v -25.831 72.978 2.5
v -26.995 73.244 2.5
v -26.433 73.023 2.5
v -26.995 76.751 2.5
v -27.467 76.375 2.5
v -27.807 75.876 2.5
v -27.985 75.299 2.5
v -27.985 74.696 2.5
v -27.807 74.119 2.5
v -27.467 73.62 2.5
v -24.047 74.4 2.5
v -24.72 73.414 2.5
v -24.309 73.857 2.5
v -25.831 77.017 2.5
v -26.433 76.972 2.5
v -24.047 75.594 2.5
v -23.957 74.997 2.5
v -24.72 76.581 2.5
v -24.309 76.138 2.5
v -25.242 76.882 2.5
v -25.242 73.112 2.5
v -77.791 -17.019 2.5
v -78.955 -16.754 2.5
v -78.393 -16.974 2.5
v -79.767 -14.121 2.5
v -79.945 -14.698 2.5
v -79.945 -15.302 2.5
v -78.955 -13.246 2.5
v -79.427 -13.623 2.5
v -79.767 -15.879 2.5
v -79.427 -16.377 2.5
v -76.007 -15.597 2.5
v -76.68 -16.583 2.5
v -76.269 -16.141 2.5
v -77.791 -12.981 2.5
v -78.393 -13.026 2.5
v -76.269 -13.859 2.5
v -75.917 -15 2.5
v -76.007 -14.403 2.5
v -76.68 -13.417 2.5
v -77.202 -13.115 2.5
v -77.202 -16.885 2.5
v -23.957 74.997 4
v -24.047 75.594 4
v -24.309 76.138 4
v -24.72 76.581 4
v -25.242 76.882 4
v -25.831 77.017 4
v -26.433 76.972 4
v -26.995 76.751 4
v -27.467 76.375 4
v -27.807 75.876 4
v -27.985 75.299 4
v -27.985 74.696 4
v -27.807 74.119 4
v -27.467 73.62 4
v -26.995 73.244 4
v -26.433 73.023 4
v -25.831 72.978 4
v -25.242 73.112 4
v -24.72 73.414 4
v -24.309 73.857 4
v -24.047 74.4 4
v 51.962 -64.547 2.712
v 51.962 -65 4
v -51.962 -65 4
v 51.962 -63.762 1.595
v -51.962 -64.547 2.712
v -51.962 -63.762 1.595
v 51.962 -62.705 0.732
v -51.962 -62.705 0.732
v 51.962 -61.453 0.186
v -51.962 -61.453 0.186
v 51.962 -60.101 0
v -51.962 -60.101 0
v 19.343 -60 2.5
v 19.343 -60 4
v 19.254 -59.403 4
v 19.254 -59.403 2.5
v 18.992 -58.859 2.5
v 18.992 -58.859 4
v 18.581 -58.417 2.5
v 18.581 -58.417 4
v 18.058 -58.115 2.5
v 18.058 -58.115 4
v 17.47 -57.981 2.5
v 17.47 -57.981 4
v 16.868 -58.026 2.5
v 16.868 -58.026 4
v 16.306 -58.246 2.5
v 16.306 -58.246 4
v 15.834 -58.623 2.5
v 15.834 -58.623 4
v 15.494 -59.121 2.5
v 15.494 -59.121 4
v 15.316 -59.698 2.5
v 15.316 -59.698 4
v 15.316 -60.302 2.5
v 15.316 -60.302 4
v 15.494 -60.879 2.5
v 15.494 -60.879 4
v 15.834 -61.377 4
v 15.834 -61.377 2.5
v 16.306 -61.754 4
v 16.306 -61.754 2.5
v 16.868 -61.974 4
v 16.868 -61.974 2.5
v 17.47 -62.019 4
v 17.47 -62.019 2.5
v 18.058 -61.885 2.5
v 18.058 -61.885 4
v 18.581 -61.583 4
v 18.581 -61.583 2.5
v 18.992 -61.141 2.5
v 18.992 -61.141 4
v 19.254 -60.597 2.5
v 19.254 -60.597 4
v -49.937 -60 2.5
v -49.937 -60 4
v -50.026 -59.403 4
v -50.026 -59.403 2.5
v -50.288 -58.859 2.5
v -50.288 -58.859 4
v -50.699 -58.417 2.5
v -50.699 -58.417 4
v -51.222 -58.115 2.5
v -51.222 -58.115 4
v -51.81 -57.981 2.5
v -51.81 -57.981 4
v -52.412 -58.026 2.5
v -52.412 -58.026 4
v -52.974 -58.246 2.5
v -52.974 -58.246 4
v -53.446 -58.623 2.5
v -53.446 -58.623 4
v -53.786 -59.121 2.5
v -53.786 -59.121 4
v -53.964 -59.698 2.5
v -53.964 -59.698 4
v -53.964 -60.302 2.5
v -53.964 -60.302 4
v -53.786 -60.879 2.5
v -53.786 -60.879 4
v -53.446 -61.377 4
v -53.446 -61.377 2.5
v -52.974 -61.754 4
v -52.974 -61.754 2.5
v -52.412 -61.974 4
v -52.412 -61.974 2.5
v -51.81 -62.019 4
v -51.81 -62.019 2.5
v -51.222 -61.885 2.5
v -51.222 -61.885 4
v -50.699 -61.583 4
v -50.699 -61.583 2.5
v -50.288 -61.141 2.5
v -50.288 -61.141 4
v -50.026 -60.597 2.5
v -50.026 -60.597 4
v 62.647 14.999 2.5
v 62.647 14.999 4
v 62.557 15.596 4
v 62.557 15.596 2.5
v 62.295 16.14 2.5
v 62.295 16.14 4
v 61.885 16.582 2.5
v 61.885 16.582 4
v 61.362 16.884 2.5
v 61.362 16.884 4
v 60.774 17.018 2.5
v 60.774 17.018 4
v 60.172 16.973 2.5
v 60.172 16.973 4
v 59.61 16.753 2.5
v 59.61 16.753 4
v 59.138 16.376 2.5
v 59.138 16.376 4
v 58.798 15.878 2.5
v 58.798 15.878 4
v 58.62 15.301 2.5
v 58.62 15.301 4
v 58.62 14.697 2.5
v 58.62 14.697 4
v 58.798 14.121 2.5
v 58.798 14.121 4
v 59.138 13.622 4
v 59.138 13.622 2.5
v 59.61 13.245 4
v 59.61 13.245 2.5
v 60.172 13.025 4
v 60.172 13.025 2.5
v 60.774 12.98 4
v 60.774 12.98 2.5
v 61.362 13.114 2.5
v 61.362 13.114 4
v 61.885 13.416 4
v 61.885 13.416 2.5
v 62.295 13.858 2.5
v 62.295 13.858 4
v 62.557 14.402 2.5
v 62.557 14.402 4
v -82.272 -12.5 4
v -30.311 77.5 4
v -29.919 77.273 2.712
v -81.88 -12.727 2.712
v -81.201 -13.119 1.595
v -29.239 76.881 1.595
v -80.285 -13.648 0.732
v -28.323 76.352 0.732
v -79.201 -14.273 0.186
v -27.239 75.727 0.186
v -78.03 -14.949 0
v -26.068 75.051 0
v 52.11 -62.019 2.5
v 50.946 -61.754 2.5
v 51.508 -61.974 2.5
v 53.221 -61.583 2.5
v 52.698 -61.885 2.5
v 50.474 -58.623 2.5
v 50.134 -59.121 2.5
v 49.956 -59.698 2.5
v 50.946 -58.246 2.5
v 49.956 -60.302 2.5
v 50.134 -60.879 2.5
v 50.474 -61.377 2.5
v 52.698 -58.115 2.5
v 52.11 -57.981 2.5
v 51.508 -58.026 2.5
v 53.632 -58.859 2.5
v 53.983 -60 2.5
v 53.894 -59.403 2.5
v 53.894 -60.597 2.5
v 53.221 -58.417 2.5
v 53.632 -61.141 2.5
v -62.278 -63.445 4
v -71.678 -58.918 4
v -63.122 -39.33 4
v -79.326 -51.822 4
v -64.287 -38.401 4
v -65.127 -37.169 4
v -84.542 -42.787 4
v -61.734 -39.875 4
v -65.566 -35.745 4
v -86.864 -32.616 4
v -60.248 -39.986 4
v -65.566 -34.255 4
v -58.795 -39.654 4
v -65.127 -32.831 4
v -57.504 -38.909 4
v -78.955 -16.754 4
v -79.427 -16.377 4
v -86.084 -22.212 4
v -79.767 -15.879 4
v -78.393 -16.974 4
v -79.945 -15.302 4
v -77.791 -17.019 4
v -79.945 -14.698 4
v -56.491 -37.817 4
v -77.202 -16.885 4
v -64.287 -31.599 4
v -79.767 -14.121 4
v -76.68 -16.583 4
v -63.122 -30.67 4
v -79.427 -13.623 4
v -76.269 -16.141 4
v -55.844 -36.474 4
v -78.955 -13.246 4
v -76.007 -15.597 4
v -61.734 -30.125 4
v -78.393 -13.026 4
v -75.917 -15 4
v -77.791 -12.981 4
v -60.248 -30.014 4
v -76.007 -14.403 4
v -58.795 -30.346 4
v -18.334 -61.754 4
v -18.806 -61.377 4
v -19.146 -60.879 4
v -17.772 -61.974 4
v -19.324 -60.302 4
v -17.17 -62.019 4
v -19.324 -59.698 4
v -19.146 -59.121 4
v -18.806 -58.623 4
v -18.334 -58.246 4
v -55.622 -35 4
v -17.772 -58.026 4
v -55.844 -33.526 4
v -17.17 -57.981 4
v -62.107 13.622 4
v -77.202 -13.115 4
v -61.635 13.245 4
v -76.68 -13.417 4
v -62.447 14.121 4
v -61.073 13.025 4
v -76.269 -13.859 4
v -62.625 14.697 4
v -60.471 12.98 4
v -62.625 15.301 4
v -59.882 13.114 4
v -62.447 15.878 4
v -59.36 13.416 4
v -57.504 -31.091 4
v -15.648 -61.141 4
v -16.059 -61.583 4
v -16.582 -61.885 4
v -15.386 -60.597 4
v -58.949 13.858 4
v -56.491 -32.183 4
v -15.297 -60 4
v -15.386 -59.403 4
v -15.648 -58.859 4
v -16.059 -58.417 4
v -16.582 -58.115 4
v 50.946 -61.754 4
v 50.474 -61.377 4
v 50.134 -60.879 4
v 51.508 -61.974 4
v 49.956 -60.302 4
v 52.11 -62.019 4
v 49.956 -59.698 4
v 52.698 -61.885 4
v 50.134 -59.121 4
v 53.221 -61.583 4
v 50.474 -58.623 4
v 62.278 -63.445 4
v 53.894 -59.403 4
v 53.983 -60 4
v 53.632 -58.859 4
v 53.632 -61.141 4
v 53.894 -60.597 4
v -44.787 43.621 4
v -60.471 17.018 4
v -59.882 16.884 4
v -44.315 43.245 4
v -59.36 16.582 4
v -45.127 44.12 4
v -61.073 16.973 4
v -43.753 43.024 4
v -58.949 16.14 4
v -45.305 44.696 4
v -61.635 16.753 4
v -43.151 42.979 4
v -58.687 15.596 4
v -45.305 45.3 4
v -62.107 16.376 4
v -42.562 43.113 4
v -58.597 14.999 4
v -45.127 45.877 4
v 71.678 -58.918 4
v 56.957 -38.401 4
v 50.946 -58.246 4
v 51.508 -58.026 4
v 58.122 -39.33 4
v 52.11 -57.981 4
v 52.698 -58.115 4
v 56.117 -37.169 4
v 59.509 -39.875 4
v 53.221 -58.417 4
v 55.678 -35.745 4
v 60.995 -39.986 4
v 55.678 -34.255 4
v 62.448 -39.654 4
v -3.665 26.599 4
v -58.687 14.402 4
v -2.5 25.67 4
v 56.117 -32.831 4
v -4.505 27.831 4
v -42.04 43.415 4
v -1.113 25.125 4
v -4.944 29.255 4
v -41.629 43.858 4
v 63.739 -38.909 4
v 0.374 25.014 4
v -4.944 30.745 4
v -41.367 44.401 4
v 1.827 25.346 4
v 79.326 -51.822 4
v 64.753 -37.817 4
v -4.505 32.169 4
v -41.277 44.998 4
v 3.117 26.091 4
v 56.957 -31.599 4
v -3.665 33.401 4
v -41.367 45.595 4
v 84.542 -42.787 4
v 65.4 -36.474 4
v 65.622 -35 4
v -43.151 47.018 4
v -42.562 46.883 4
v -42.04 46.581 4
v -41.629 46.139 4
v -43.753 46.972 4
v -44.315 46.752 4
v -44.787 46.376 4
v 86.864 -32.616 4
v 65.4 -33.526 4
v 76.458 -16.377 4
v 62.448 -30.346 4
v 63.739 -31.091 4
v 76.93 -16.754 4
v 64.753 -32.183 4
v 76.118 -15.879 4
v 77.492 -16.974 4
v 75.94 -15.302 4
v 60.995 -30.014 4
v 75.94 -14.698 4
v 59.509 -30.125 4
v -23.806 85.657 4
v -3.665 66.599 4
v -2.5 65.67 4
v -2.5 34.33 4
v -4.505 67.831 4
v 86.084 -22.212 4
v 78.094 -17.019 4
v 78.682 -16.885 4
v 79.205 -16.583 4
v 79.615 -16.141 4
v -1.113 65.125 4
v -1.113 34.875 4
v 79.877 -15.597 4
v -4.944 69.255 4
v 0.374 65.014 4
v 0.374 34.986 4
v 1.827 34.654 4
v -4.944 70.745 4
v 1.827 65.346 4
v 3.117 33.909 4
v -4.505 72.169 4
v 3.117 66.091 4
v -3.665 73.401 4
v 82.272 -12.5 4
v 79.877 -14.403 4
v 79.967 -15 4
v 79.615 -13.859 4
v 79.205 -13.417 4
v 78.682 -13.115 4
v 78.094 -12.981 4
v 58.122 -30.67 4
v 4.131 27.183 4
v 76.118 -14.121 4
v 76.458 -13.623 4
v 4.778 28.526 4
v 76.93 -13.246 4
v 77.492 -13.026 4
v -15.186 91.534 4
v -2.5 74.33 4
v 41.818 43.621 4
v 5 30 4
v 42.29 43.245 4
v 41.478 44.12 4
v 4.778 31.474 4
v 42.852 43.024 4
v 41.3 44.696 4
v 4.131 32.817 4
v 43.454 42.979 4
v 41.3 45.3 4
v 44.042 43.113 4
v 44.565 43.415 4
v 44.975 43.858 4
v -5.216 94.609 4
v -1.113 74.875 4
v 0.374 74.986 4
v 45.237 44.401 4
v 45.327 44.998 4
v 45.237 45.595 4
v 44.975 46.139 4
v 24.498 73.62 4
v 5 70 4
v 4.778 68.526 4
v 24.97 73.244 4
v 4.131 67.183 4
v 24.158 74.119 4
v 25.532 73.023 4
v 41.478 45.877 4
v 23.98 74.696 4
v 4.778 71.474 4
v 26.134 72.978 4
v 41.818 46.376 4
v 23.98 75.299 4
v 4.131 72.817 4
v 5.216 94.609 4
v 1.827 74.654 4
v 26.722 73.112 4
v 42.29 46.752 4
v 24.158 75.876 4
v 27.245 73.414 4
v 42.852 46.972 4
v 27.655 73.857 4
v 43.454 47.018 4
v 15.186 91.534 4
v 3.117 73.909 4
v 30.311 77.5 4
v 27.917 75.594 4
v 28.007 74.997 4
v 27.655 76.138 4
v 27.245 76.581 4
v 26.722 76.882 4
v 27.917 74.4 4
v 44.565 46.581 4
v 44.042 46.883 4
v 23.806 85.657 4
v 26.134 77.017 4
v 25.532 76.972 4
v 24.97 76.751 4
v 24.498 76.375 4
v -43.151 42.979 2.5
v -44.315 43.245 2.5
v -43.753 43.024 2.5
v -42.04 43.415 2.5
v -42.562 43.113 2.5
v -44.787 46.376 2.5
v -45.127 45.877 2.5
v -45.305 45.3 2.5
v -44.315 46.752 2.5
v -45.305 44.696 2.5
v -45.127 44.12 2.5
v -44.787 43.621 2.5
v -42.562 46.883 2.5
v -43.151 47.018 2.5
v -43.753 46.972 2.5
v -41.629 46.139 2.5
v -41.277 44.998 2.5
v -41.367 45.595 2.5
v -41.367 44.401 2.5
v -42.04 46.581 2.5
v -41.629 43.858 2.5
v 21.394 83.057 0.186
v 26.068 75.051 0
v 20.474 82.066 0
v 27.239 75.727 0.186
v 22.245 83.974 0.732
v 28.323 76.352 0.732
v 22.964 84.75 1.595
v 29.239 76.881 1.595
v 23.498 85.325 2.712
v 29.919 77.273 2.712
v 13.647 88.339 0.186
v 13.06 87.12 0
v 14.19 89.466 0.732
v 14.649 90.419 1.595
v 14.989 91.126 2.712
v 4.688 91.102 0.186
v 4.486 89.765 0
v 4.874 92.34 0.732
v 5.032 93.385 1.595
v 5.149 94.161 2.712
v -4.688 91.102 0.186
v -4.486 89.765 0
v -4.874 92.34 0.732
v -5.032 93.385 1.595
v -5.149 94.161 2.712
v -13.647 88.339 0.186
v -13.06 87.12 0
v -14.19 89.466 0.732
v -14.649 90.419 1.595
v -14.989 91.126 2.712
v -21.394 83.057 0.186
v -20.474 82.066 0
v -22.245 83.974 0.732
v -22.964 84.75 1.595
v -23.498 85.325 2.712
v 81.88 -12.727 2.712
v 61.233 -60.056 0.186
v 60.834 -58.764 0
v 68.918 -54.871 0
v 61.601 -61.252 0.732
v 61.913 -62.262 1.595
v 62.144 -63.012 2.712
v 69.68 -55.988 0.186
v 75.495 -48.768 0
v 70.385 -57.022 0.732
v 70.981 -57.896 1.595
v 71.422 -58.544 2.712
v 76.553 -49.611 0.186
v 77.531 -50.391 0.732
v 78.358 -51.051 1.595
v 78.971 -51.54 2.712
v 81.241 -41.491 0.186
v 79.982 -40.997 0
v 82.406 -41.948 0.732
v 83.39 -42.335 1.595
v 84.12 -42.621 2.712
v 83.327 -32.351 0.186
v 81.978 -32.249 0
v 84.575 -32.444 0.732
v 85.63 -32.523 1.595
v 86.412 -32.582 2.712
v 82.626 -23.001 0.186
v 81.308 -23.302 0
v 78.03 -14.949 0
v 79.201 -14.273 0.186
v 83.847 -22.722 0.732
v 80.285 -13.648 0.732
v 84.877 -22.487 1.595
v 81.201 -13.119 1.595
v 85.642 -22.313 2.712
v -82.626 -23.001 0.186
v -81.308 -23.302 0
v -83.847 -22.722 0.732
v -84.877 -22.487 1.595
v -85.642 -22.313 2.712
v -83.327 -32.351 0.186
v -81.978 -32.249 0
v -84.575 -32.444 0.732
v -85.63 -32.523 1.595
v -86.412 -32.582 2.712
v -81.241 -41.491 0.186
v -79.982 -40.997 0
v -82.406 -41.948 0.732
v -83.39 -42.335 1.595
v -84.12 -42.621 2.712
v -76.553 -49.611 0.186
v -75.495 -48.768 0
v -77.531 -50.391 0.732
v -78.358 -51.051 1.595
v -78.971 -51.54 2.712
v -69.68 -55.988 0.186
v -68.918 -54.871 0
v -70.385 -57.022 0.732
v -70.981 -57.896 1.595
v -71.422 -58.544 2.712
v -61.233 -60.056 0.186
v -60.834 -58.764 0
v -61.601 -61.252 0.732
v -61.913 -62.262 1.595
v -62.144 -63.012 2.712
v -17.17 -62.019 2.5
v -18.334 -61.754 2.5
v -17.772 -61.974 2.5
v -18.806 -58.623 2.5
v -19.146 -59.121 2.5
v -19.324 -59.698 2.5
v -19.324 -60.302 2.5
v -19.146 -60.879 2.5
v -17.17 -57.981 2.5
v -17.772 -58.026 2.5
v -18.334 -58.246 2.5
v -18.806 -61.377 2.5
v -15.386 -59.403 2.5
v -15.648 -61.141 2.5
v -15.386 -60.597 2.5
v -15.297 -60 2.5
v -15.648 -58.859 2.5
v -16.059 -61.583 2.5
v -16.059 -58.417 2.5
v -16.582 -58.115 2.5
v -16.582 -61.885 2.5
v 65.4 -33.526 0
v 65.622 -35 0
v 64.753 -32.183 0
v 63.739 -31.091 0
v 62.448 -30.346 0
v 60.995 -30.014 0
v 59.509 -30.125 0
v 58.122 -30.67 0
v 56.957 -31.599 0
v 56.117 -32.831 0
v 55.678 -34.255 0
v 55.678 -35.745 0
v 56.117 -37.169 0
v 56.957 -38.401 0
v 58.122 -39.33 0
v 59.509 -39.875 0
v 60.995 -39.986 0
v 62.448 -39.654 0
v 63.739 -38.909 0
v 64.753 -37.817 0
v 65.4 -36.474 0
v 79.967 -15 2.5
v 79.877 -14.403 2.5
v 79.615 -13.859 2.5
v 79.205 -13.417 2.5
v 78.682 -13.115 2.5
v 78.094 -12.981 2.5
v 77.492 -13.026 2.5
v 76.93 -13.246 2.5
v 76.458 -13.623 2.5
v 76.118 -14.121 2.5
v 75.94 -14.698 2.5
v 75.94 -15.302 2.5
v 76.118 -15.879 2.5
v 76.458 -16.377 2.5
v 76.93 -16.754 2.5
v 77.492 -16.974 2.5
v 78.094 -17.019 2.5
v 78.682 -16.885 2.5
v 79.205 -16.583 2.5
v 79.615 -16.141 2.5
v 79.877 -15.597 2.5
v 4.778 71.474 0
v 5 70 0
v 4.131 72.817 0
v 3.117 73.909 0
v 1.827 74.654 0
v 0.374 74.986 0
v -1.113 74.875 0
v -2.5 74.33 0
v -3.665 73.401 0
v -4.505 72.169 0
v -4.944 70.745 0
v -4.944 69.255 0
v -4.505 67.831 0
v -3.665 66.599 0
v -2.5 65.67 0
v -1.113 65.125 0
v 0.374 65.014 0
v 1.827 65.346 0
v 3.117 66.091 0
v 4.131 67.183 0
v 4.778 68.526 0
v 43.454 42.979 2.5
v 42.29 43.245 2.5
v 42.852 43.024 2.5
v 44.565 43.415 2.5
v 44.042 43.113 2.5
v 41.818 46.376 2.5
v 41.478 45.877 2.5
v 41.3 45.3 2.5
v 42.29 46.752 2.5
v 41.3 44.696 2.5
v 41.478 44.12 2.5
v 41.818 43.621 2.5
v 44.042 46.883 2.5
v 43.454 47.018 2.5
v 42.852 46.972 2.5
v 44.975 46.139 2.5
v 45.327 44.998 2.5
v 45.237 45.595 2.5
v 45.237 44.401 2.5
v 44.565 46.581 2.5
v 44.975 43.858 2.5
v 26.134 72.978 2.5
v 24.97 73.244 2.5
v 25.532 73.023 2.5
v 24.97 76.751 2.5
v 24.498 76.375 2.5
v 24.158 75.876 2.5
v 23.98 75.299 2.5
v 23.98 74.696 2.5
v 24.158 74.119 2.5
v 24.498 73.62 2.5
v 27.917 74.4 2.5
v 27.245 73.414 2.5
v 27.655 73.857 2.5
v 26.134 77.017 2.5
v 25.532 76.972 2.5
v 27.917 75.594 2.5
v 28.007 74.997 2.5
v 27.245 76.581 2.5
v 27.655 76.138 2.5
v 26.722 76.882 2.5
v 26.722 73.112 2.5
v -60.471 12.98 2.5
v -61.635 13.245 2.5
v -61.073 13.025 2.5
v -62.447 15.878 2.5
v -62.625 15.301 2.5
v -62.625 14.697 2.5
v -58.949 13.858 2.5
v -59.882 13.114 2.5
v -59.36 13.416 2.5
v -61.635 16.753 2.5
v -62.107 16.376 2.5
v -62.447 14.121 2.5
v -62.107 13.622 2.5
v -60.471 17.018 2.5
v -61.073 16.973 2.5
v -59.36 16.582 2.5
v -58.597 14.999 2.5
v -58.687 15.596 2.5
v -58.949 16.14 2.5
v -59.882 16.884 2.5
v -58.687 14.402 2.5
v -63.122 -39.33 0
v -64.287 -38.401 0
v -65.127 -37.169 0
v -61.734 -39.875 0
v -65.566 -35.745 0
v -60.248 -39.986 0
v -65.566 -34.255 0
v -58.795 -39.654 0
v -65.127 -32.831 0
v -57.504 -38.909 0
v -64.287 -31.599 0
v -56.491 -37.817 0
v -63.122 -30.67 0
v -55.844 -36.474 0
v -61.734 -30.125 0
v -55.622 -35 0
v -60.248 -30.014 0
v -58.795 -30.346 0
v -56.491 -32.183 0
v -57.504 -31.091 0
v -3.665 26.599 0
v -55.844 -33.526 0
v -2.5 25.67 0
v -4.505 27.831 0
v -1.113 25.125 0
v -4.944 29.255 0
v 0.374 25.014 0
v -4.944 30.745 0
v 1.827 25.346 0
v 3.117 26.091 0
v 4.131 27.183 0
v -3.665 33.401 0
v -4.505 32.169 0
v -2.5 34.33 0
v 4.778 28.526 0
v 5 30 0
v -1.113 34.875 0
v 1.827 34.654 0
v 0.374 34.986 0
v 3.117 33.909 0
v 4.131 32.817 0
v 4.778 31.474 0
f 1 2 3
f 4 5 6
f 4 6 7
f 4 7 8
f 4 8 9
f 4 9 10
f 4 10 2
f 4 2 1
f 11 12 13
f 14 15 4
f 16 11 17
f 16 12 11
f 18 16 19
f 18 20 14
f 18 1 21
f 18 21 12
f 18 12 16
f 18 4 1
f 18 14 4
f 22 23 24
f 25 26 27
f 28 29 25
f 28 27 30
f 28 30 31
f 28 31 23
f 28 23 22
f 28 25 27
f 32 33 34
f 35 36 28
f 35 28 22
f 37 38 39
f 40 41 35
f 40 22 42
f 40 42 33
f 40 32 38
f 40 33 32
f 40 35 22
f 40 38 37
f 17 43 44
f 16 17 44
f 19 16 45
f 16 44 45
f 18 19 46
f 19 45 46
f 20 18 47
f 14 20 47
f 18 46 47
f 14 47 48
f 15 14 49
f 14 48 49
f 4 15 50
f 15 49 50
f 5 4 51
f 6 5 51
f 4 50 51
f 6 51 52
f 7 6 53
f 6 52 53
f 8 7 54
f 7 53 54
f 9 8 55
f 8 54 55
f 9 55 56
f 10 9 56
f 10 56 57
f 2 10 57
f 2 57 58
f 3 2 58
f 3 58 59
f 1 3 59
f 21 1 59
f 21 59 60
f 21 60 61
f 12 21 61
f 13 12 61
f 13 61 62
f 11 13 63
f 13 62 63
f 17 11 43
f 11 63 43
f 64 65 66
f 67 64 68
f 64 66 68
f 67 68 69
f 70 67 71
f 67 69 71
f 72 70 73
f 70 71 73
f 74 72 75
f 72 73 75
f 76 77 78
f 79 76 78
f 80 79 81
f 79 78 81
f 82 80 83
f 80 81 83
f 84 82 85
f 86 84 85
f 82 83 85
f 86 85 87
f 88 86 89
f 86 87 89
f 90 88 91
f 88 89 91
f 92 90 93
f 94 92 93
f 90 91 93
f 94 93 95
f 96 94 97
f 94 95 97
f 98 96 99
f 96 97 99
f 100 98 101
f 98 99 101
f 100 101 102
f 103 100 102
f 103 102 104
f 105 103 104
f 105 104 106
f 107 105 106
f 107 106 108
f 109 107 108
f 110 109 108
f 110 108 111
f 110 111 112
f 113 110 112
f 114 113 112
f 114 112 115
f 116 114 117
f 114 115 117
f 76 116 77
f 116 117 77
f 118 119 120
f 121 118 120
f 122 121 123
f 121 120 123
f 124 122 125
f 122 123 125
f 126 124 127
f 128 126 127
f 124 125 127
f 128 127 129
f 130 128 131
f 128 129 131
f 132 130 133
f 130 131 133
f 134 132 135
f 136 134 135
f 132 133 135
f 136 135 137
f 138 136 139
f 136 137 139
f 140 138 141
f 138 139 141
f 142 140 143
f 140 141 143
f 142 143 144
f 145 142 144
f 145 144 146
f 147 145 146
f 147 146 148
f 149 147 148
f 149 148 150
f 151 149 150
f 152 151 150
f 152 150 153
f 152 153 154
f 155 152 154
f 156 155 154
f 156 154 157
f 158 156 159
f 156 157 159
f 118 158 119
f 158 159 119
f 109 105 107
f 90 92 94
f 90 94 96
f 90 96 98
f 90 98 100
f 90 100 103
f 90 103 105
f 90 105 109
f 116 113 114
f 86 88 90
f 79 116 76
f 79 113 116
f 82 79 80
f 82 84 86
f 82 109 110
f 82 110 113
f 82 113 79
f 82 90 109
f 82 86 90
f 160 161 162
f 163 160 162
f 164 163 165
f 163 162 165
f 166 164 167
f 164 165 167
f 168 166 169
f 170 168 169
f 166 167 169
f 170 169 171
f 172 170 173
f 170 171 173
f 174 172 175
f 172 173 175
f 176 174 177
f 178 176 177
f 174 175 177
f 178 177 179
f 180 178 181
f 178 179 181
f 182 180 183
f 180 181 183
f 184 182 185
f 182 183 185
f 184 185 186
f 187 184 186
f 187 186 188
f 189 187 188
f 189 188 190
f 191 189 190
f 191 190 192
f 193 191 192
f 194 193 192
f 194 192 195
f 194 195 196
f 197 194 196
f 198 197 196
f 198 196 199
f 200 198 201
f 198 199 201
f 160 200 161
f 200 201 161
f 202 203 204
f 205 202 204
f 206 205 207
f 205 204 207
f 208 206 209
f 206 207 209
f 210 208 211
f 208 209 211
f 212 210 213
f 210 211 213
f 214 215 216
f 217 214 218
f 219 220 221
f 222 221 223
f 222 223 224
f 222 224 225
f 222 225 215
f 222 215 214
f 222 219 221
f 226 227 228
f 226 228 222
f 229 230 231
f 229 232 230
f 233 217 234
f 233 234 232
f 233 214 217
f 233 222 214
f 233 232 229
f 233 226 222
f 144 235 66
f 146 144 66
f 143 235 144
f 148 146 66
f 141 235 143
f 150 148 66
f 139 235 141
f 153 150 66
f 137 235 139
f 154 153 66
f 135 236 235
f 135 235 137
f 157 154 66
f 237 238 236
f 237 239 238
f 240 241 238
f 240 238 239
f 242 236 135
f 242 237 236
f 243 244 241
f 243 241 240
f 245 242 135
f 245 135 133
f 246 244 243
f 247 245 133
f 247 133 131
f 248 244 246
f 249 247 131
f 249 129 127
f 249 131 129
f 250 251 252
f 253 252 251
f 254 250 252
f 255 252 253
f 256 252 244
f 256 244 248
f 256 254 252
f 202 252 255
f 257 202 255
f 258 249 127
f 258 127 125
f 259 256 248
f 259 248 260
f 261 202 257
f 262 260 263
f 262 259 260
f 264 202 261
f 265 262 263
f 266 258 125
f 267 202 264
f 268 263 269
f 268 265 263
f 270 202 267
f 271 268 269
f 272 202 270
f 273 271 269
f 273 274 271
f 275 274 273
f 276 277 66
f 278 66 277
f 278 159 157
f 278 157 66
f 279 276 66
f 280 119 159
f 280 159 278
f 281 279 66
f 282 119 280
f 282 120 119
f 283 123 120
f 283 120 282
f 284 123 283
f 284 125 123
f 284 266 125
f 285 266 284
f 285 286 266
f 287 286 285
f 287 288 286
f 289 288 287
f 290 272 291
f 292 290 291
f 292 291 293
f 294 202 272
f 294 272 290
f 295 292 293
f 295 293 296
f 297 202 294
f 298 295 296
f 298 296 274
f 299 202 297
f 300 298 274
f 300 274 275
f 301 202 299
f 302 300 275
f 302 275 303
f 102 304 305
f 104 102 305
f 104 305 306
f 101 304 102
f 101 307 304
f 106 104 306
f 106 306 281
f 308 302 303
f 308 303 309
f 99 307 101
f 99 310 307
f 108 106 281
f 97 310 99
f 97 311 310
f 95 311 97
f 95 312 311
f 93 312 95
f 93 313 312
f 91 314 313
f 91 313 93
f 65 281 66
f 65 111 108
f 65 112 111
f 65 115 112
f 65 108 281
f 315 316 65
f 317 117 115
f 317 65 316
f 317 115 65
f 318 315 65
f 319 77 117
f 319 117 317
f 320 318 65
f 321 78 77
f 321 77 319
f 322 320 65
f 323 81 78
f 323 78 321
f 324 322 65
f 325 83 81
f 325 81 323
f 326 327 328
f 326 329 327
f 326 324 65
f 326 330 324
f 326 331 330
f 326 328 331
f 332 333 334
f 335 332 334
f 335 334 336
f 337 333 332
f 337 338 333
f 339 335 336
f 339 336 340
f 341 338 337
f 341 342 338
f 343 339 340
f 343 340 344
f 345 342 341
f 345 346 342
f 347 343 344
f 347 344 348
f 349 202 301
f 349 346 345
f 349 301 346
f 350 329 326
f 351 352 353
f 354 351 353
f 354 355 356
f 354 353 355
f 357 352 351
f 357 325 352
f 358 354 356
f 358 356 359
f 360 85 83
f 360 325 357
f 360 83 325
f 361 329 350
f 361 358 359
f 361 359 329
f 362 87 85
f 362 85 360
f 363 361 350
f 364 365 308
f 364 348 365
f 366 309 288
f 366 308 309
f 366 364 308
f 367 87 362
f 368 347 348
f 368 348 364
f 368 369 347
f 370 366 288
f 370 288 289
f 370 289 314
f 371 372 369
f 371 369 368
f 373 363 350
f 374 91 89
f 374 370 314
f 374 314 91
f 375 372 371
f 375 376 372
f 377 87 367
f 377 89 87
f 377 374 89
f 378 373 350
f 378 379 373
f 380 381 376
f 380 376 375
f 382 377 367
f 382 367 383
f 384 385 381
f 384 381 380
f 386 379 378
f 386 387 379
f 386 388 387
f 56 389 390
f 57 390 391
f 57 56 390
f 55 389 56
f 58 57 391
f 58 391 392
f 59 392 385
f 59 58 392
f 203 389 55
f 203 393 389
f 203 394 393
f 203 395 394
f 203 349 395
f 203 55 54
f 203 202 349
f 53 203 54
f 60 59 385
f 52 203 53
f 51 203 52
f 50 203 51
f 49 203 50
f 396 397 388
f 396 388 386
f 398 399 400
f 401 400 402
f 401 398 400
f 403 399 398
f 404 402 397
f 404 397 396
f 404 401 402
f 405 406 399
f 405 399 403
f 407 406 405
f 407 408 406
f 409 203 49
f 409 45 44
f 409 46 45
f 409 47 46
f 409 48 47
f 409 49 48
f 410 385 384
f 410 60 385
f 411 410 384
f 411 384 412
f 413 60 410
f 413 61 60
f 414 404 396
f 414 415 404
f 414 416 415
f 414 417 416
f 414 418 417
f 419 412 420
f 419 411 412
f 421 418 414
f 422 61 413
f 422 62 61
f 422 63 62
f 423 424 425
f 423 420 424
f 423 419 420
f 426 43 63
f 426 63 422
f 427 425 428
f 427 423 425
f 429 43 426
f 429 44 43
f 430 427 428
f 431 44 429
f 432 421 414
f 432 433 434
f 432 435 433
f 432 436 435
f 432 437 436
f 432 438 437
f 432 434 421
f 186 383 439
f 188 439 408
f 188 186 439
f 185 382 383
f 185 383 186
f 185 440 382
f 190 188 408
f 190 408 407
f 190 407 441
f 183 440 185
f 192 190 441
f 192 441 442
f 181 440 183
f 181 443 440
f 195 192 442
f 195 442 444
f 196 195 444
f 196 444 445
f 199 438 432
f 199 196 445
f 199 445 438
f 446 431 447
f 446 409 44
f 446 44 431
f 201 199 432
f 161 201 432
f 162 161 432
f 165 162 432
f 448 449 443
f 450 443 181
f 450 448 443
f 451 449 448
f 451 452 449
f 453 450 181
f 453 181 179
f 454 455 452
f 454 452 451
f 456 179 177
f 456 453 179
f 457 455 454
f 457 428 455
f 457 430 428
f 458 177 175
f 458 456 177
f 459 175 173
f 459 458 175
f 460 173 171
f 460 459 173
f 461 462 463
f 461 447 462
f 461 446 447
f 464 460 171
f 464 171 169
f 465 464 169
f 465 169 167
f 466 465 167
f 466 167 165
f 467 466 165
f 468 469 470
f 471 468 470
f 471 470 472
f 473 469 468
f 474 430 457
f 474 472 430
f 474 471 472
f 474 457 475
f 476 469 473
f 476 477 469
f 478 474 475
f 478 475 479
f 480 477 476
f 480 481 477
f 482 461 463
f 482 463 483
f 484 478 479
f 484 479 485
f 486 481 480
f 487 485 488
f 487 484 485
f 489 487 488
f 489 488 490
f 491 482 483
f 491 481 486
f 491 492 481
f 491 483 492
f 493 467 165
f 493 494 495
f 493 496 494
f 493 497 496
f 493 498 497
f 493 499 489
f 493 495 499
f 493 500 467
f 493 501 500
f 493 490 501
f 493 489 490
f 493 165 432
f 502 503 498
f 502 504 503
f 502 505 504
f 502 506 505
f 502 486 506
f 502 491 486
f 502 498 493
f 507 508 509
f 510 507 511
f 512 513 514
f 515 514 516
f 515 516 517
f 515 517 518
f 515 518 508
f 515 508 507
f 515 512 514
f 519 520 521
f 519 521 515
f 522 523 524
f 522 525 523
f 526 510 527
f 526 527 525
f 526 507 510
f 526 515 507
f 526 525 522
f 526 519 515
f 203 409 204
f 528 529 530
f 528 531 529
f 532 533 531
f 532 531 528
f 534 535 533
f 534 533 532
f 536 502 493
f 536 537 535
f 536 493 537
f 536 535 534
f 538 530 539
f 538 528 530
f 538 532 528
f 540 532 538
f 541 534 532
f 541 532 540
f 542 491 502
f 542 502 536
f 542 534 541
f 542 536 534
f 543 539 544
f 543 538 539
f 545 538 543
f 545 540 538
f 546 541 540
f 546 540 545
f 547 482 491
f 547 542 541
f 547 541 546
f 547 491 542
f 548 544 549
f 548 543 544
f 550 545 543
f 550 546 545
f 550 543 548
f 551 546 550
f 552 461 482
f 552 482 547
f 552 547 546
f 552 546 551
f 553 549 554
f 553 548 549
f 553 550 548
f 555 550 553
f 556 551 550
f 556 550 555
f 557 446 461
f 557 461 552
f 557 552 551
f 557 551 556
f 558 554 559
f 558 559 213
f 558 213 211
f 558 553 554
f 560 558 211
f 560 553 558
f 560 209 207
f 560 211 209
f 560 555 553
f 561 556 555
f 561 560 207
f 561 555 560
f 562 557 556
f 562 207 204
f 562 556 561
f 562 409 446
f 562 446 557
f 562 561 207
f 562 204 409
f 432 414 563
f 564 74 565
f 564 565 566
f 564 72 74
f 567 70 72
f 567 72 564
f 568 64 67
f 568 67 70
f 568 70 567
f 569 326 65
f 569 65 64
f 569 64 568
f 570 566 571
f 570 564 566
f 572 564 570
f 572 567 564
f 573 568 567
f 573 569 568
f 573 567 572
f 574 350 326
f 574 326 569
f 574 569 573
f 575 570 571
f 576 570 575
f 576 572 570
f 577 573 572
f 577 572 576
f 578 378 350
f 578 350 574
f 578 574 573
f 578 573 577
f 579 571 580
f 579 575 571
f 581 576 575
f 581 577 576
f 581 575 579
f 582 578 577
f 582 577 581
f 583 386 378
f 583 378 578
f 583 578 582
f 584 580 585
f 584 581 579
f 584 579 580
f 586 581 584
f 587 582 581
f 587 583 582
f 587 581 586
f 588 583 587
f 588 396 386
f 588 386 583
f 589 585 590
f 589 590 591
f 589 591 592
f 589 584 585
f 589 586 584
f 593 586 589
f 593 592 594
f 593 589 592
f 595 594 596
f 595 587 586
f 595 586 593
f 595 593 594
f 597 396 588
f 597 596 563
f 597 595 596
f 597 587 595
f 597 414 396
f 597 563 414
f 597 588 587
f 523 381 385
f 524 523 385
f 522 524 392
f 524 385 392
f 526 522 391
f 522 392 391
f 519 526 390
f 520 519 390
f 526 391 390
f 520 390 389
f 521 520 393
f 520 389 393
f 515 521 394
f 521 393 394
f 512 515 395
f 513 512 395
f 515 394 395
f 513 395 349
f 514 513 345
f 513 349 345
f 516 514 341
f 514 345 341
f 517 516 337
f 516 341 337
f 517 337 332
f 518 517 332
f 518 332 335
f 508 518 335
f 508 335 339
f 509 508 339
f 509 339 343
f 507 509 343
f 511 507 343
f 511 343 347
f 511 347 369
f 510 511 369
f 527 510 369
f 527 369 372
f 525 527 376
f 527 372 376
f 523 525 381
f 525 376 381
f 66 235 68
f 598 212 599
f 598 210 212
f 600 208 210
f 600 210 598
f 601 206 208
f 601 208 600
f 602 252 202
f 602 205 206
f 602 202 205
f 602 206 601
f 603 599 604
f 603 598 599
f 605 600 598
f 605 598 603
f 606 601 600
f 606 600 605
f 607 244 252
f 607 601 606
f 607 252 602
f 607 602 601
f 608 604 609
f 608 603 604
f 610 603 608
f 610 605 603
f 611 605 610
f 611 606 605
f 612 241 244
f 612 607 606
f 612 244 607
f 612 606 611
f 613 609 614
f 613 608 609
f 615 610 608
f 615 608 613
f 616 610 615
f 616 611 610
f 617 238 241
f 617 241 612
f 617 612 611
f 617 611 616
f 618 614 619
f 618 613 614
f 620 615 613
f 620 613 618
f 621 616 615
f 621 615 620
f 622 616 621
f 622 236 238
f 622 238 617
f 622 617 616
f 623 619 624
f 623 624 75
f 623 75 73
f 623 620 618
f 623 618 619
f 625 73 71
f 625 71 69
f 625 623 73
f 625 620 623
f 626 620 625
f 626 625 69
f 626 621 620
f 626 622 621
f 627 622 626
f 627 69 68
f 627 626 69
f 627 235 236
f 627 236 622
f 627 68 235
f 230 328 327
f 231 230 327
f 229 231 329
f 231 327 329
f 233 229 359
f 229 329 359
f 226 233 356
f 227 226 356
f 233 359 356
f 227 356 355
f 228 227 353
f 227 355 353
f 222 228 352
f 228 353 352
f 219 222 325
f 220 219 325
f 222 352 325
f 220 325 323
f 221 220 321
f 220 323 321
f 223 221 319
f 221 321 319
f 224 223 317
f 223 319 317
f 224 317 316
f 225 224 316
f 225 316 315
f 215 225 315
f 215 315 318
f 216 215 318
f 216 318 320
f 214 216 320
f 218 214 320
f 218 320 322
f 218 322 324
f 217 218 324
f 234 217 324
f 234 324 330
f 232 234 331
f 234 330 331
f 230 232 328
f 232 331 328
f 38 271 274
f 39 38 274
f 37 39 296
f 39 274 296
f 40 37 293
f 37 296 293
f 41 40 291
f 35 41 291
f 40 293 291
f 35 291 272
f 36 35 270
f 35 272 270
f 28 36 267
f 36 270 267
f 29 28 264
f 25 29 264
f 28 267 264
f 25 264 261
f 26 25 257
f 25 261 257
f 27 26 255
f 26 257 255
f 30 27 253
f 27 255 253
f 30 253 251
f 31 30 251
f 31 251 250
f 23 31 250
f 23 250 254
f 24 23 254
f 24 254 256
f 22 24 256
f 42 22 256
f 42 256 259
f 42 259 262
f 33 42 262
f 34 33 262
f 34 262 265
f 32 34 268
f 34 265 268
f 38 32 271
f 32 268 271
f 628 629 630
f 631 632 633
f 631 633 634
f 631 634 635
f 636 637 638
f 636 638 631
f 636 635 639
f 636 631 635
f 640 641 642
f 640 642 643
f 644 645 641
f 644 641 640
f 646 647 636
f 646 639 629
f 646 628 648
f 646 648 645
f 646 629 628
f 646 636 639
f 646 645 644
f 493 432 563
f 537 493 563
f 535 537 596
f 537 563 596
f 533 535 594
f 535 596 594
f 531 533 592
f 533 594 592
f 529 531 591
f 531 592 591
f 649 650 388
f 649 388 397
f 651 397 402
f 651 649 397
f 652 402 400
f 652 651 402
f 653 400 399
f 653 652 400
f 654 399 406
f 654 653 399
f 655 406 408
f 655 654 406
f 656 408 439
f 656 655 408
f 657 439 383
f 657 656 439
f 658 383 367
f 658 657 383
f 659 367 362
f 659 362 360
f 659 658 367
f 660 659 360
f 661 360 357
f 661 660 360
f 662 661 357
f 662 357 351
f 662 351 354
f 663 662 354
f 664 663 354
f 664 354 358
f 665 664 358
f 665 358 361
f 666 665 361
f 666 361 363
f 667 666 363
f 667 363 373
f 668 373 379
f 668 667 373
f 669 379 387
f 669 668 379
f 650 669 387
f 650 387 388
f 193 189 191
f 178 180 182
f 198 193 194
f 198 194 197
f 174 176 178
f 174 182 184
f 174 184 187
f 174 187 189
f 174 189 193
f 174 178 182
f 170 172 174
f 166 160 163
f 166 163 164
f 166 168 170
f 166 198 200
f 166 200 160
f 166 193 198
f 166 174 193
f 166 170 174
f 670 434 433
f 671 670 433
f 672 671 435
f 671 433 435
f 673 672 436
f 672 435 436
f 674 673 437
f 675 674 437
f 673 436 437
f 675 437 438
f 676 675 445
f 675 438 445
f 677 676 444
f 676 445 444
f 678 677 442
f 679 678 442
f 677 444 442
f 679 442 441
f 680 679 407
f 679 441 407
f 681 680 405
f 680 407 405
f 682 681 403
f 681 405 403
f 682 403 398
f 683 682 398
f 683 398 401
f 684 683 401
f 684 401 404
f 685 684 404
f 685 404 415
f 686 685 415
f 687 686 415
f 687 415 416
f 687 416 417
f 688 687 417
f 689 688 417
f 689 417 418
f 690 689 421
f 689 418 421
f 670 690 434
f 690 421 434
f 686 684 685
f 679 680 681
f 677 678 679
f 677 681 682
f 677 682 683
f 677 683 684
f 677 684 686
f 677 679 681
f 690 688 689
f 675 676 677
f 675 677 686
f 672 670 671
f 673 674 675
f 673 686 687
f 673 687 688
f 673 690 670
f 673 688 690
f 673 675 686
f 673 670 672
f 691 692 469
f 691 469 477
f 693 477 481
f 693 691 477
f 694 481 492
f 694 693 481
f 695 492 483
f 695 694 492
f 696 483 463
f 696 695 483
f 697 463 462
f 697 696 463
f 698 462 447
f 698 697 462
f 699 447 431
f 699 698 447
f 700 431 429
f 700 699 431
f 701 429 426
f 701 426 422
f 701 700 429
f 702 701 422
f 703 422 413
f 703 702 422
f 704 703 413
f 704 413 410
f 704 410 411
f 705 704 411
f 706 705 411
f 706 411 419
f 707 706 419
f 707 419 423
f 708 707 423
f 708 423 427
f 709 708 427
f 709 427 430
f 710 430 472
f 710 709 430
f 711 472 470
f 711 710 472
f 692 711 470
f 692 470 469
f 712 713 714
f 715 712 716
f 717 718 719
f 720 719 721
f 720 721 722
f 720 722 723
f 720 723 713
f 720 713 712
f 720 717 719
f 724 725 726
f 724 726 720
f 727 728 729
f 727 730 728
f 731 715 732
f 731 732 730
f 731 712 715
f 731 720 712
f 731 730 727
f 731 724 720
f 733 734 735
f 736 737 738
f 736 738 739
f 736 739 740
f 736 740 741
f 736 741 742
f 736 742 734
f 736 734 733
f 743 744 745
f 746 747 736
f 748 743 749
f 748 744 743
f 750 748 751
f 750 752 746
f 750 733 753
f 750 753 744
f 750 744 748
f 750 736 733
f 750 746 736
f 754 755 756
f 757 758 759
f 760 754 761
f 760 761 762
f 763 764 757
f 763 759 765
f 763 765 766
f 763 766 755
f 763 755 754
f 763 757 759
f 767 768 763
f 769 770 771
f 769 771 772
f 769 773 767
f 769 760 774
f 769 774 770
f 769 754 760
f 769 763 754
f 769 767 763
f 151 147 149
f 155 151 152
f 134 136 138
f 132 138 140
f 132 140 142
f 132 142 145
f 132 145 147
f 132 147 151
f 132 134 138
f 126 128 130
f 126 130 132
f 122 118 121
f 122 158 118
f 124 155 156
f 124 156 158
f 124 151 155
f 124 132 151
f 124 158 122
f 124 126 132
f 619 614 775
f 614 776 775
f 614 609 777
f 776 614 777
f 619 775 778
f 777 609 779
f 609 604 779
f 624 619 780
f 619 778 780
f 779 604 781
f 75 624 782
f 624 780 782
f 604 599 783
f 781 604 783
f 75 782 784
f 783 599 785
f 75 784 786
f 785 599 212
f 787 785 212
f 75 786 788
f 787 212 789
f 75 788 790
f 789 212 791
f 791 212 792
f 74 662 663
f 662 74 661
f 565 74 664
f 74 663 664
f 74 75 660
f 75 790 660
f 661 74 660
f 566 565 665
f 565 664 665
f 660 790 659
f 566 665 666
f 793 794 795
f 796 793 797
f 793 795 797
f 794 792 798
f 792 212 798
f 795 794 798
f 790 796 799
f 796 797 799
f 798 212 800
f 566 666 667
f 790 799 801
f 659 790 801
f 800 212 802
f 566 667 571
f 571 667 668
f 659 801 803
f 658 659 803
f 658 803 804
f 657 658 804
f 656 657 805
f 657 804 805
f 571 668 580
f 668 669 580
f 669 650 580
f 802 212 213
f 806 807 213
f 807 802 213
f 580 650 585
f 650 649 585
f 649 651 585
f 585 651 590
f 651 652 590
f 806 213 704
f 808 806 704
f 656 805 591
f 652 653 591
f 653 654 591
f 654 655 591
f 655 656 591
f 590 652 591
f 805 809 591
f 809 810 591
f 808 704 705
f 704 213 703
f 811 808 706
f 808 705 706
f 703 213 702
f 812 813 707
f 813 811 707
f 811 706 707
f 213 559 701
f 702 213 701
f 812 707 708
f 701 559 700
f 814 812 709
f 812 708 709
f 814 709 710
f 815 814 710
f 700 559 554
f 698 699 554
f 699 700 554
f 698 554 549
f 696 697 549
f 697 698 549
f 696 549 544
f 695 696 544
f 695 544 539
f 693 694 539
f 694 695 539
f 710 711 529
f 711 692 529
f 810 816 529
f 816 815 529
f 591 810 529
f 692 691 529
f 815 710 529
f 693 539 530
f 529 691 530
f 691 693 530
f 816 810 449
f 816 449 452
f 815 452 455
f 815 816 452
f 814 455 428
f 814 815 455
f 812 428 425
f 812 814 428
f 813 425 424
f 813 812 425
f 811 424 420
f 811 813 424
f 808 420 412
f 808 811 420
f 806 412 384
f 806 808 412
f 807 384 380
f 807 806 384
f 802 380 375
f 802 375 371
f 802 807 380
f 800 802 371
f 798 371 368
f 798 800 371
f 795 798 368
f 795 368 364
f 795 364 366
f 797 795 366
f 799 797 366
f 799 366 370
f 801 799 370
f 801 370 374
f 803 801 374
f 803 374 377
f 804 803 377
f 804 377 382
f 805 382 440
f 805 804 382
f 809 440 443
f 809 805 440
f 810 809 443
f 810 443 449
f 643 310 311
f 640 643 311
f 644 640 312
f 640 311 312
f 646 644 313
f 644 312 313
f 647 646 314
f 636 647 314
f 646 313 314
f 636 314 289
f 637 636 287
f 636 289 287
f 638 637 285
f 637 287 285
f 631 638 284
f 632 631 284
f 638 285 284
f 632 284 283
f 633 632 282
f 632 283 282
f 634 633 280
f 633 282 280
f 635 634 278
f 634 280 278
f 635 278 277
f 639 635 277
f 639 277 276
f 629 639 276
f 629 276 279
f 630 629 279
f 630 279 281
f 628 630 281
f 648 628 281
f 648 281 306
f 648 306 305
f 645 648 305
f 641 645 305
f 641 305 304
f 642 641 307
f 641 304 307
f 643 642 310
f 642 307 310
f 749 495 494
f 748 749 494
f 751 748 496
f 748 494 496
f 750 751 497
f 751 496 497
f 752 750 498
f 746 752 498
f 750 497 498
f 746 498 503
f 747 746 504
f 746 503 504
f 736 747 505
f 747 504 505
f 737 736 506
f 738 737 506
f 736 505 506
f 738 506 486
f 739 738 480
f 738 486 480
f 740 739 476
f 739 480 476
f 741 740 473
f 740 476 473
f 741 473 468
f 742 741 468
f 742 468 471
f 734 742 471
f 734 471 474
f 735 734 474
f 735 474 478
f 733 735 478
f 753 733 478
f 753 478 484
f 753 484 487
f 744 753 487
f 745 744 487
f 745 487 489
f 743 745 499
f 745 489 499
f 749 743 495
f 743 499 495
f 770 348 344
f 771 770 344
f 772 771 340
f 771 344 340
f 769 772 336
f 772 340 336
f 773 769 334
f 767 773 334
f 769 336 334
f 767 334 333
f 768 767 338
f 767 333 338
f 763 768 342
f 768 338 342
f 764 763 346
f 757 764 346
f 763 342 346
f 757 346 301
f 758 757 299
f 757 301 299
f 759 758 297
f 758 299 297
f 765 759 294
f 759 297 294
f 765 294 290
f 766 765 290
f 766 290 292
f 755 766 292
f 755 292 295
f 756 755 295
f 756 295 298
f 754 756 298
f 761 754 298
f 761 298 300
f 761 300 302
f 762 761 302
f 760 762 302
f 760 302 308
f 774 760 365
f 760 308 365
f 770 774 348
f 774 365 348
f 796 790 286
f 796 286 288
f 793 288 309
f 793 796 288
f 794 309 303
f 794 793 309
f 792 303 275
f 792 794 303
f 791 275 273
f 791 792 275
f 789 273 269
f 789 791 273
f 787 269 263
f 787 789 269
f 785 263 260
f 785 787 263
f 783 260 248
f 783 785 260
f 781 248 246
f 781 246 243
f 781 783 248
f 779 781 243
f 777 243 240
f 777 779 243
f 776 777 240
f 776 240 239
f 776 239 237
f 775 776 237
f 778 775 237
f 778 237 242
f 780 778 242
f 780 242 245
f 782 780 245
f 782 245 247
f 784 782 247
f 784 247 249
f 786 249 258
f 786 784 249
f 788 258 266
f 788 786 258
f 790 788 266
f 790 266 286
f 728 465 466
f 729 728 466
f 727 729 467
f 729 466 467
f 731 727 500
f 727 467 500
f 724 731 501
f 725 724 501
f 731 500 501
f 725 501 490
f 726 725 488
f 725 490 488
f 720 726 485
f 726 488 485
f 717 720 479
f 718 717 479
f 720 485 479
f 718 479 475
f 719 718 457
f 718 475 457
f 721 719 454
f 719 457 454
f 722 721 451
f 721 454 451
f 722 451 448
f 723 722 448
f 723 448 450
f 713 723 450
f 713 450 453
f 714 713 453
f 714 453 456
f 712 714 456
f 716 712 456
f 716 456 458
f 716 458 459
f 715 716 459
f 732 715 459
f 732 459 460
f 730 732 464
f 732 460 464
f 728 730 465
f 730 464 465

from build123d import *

# Parameters (mm, degrees)
RESSALTO_EXTRUS_O1_DEPTH = 4
ESBO_O2_R                = 5
CORTE_EXTRUS_O1_DEPTH    = 4
ESBO_O3_R                = 2.025
CORTE_EXTRUS_O2_DEPTH    = 1.5
FILETE1_R                = 5


with BuildPart() as part:
    # Esboço1 → Ressalto-extrusão1 (new body)
    with BuildSketch(Plane.XY):
        with BuildLine():
            Line((-30.310889132, 77.5), (-82.27241336, -12.5))
            ThreePointArc((-82.27241336, -12.5), (-82.27241336, -47.5), (-51.961524227, -65))
            Line((-51.961524227, -65), (51.961524227, -65))
            ThreePointArc((51.961524227, -65), (82.27241336, -47.5), (82.27241336, -12.5))
            Line((82.27241336, -12.5), (30.310889132, 77.5))
            ThreePointArc((30.310889132, 77.5), (0, 95), (-30.310889132, 77.5))
        make_face()
    extrude(amount=RESSALTO_EXTRUS_O1_DEPTH)

    # Esboço2 → Corte-extrusão1 (cut)
    with BuildSketch(Plane.XY):
        with Locations((0, 70)):
            Circle(ESBO_O2_R)
        with Locations((60.621778265, -35)):
            Circle(ESBO_O2_R)
        with Locations((-60.621778265, -35)):
            Circle(ESBO_O2_R)
        with Locations((0, 30)):
            Circle(ESBO_O2_R)
    extrude(amount=CORTE_EXTRUS_O1_DEPTH, mode=Mode.SUBTRACT)

    # Esboço3 → Corte-extrusão2 (cut)
    with BuildSketch(Plane.XY.offset(4)):
        with Locations((-77.942286341, -15)):
            Circle(ESBO_O3_R)
        with Locations((-51.961524227, -60)):
            Circle(ESBO_O3_R)
        with Locations((77.942286341, -15)):
            Circle(ESBO_O3_R)
        with Locations((-60.622286341, 14.999119987)):
            Circle(ESBO_O3_R)
        with Locations((-43.302286341, 44.998239974)):
            Circle(ESBO_O3_R)
        with Locations((-25.982286341, 74.997359961)):
            Circle(ESBO_O3_R)
        with Locations((60.622286341, 14.999119987)):
            Circle(ESBO_O3_R)
        with Locations((43.302286341, 44.998239974)):
            Circle(ESBO_O3_R)
        with Locations((25.982286341, 74.997359961)):
            Circle(ESBO_O3_R)
        with Locations((-17.321524227, -60)):
            Circle(ESBO_O3_R)
        with Locations((17.318475773, -60)):
            Circle(ESBO_O3_R)
        with Locations((51.958475773, -60)):
            Circle(ESBO_O3_R)
    extrude(amount=-CORTE_EXTRUS_O2_DEPTH, mode=Mode.SUBTRACT)

    # Filete1
    # the kernel refuses this fillet: 5 mm, written as the material it takes off along each edge
    with BuildSketch(Plane(origin=(-51.961524227, -30, 0), x_dir=(-0.8660254037844398, 0.49999999999999795, 0), z_dir=(0.49999999999999795, 0.8660254037844398, 0))) as filete1_piece_1:
        with BuildLine():
            CenterArc((30.101020514, 5), FILETE1_R, 270, 78.463040967)
            Line((35, 4), (35.09797959, 3.98))
            ThreePointArc((35.09797959, 3.98), (35.1, 2), (35.1, 0))
            Line((35.1, 0), (35, -0.1))
            Line((35, -0.1), (30.101020514, -0.1))
            Line((30.101020514, -0.1), (30.101020514, 0))
        make_face()
    revolve(axis=Axis((-51.961524227, -30, 0), (0, 0, 1)), revolution_arc=120, mode=Mode.SUBTRACT)
    with BuildSketch(Plane(origin=(-30.310889132, 77.5, 0), x_dir=(0.8660254037844398, -0.4999999999999981, 0), z_dir=(-0.4999999999999981, -0.8660254037844398, 0)), Plane(origin=(-51.961524227, -65, 0), x_dir=(0, 1, 0), z_dir=(1, 0, 0))) as filete1_piece_2:
        with BuildLine():
            CenterArc((4.898979486, 5), FILETE1_R, 191.536959033, 78.463040967)
            Line((0, 4), (-0.09797959, 3.98))
            ThreePointArc((-0.09797959, 3.98), (-0.1, 2), (-0.1, 0))
            Line((-0.1, 0), (0, -0.1))
            Line((0, -0.1), (4.898979486, -0.1))
            Line((4.898979486, -0.1), (4.898979486, 0))
        make_face()
    extrude(amount=103.923048454, mode=Mode.SUBTRACT)
    with BuildSketch(Plane(origin=(0, 60, 0), x_dir=(0.8660254037844363, 0.5000000000000041, 0), z_dir=(0.5000000000000041, -0.8660254037844363, 0))) as filete1_piece_3:
        with BuildLine():
            CenterArc((30.101020514, 5), FILETE1_R, 270, 78.463040967)
            Line((30.101020514, 0), (30.101020514, -0.1))
            Line((30.101020514, -0.1), (35, -0.1))
            Line((35, -0.1), (35.1, 0))
            ThreePointArc((35.1, 0), (35.1, 2), (35.09797959, 3.98))
            Line((35.09797959, 3.98), (35, 4))
        make_face()
    revolve(axis=Axis((0, 60, 0), (0, 0, 1)), revolution_arc=120, mode=Mode.SUBTRACT)
    with BuildSketch(Plane(origin=(82.27241336, -12.5, 0), x_dir=(-1.3637382312526318e-12, -7.873546349178999e-13, 1.0), z_dir=(-0.5000000000000043, 0.8660254037844363, 0))) as filete1_piece_4:
        with BuildLine():
            CenterArc((5, -4.898979486), FILETE1_R, 101.536959033, 78.463040967)
            Line((0, -4.898979486), (-0.1, -4.898979486))
            Line((-0.1, -4.898979486), (-0.1, 0))
            Line((-0.1, 0), (0, 0.1))
            ThreePointArc((0, 0.1), (2, 0.1), (3.98, 0.09797959))
            Line((3.98, 0.09797959), (4, 0))
        make_face()
    extrude(amount=103.923048454, mode=Mode.SUBTRACT)
    with BuildSketch(Plane(origin=(51.961524227, -30, 0), x_dir=(0, -1, 0), z_dir=(-1, 0, 0))) as filete1_piece_5:
        with BuildLine():
            CenterArc((30.101020514, 5), FILETE1_R, 270, 78.463040967)
            Line((30.101020514, 0), (30.101020514, -0.1))
            Line((30.101020514, -0.1), (35, -0.1))
            Line((35, -0.1), (35.1, 0))
            ThreePointArc((35.1, 0), (35.1, 2), (35.09797959, 3.98))
            Line((35.09797959, 3.98), (35, 4))
        make_face()
    revolve(axis=Axis((51.961524227, -30, 0), (0, 0, 1)), revolution_arc=120, mode=Mode.SUBTRACT)


solid = part.part
